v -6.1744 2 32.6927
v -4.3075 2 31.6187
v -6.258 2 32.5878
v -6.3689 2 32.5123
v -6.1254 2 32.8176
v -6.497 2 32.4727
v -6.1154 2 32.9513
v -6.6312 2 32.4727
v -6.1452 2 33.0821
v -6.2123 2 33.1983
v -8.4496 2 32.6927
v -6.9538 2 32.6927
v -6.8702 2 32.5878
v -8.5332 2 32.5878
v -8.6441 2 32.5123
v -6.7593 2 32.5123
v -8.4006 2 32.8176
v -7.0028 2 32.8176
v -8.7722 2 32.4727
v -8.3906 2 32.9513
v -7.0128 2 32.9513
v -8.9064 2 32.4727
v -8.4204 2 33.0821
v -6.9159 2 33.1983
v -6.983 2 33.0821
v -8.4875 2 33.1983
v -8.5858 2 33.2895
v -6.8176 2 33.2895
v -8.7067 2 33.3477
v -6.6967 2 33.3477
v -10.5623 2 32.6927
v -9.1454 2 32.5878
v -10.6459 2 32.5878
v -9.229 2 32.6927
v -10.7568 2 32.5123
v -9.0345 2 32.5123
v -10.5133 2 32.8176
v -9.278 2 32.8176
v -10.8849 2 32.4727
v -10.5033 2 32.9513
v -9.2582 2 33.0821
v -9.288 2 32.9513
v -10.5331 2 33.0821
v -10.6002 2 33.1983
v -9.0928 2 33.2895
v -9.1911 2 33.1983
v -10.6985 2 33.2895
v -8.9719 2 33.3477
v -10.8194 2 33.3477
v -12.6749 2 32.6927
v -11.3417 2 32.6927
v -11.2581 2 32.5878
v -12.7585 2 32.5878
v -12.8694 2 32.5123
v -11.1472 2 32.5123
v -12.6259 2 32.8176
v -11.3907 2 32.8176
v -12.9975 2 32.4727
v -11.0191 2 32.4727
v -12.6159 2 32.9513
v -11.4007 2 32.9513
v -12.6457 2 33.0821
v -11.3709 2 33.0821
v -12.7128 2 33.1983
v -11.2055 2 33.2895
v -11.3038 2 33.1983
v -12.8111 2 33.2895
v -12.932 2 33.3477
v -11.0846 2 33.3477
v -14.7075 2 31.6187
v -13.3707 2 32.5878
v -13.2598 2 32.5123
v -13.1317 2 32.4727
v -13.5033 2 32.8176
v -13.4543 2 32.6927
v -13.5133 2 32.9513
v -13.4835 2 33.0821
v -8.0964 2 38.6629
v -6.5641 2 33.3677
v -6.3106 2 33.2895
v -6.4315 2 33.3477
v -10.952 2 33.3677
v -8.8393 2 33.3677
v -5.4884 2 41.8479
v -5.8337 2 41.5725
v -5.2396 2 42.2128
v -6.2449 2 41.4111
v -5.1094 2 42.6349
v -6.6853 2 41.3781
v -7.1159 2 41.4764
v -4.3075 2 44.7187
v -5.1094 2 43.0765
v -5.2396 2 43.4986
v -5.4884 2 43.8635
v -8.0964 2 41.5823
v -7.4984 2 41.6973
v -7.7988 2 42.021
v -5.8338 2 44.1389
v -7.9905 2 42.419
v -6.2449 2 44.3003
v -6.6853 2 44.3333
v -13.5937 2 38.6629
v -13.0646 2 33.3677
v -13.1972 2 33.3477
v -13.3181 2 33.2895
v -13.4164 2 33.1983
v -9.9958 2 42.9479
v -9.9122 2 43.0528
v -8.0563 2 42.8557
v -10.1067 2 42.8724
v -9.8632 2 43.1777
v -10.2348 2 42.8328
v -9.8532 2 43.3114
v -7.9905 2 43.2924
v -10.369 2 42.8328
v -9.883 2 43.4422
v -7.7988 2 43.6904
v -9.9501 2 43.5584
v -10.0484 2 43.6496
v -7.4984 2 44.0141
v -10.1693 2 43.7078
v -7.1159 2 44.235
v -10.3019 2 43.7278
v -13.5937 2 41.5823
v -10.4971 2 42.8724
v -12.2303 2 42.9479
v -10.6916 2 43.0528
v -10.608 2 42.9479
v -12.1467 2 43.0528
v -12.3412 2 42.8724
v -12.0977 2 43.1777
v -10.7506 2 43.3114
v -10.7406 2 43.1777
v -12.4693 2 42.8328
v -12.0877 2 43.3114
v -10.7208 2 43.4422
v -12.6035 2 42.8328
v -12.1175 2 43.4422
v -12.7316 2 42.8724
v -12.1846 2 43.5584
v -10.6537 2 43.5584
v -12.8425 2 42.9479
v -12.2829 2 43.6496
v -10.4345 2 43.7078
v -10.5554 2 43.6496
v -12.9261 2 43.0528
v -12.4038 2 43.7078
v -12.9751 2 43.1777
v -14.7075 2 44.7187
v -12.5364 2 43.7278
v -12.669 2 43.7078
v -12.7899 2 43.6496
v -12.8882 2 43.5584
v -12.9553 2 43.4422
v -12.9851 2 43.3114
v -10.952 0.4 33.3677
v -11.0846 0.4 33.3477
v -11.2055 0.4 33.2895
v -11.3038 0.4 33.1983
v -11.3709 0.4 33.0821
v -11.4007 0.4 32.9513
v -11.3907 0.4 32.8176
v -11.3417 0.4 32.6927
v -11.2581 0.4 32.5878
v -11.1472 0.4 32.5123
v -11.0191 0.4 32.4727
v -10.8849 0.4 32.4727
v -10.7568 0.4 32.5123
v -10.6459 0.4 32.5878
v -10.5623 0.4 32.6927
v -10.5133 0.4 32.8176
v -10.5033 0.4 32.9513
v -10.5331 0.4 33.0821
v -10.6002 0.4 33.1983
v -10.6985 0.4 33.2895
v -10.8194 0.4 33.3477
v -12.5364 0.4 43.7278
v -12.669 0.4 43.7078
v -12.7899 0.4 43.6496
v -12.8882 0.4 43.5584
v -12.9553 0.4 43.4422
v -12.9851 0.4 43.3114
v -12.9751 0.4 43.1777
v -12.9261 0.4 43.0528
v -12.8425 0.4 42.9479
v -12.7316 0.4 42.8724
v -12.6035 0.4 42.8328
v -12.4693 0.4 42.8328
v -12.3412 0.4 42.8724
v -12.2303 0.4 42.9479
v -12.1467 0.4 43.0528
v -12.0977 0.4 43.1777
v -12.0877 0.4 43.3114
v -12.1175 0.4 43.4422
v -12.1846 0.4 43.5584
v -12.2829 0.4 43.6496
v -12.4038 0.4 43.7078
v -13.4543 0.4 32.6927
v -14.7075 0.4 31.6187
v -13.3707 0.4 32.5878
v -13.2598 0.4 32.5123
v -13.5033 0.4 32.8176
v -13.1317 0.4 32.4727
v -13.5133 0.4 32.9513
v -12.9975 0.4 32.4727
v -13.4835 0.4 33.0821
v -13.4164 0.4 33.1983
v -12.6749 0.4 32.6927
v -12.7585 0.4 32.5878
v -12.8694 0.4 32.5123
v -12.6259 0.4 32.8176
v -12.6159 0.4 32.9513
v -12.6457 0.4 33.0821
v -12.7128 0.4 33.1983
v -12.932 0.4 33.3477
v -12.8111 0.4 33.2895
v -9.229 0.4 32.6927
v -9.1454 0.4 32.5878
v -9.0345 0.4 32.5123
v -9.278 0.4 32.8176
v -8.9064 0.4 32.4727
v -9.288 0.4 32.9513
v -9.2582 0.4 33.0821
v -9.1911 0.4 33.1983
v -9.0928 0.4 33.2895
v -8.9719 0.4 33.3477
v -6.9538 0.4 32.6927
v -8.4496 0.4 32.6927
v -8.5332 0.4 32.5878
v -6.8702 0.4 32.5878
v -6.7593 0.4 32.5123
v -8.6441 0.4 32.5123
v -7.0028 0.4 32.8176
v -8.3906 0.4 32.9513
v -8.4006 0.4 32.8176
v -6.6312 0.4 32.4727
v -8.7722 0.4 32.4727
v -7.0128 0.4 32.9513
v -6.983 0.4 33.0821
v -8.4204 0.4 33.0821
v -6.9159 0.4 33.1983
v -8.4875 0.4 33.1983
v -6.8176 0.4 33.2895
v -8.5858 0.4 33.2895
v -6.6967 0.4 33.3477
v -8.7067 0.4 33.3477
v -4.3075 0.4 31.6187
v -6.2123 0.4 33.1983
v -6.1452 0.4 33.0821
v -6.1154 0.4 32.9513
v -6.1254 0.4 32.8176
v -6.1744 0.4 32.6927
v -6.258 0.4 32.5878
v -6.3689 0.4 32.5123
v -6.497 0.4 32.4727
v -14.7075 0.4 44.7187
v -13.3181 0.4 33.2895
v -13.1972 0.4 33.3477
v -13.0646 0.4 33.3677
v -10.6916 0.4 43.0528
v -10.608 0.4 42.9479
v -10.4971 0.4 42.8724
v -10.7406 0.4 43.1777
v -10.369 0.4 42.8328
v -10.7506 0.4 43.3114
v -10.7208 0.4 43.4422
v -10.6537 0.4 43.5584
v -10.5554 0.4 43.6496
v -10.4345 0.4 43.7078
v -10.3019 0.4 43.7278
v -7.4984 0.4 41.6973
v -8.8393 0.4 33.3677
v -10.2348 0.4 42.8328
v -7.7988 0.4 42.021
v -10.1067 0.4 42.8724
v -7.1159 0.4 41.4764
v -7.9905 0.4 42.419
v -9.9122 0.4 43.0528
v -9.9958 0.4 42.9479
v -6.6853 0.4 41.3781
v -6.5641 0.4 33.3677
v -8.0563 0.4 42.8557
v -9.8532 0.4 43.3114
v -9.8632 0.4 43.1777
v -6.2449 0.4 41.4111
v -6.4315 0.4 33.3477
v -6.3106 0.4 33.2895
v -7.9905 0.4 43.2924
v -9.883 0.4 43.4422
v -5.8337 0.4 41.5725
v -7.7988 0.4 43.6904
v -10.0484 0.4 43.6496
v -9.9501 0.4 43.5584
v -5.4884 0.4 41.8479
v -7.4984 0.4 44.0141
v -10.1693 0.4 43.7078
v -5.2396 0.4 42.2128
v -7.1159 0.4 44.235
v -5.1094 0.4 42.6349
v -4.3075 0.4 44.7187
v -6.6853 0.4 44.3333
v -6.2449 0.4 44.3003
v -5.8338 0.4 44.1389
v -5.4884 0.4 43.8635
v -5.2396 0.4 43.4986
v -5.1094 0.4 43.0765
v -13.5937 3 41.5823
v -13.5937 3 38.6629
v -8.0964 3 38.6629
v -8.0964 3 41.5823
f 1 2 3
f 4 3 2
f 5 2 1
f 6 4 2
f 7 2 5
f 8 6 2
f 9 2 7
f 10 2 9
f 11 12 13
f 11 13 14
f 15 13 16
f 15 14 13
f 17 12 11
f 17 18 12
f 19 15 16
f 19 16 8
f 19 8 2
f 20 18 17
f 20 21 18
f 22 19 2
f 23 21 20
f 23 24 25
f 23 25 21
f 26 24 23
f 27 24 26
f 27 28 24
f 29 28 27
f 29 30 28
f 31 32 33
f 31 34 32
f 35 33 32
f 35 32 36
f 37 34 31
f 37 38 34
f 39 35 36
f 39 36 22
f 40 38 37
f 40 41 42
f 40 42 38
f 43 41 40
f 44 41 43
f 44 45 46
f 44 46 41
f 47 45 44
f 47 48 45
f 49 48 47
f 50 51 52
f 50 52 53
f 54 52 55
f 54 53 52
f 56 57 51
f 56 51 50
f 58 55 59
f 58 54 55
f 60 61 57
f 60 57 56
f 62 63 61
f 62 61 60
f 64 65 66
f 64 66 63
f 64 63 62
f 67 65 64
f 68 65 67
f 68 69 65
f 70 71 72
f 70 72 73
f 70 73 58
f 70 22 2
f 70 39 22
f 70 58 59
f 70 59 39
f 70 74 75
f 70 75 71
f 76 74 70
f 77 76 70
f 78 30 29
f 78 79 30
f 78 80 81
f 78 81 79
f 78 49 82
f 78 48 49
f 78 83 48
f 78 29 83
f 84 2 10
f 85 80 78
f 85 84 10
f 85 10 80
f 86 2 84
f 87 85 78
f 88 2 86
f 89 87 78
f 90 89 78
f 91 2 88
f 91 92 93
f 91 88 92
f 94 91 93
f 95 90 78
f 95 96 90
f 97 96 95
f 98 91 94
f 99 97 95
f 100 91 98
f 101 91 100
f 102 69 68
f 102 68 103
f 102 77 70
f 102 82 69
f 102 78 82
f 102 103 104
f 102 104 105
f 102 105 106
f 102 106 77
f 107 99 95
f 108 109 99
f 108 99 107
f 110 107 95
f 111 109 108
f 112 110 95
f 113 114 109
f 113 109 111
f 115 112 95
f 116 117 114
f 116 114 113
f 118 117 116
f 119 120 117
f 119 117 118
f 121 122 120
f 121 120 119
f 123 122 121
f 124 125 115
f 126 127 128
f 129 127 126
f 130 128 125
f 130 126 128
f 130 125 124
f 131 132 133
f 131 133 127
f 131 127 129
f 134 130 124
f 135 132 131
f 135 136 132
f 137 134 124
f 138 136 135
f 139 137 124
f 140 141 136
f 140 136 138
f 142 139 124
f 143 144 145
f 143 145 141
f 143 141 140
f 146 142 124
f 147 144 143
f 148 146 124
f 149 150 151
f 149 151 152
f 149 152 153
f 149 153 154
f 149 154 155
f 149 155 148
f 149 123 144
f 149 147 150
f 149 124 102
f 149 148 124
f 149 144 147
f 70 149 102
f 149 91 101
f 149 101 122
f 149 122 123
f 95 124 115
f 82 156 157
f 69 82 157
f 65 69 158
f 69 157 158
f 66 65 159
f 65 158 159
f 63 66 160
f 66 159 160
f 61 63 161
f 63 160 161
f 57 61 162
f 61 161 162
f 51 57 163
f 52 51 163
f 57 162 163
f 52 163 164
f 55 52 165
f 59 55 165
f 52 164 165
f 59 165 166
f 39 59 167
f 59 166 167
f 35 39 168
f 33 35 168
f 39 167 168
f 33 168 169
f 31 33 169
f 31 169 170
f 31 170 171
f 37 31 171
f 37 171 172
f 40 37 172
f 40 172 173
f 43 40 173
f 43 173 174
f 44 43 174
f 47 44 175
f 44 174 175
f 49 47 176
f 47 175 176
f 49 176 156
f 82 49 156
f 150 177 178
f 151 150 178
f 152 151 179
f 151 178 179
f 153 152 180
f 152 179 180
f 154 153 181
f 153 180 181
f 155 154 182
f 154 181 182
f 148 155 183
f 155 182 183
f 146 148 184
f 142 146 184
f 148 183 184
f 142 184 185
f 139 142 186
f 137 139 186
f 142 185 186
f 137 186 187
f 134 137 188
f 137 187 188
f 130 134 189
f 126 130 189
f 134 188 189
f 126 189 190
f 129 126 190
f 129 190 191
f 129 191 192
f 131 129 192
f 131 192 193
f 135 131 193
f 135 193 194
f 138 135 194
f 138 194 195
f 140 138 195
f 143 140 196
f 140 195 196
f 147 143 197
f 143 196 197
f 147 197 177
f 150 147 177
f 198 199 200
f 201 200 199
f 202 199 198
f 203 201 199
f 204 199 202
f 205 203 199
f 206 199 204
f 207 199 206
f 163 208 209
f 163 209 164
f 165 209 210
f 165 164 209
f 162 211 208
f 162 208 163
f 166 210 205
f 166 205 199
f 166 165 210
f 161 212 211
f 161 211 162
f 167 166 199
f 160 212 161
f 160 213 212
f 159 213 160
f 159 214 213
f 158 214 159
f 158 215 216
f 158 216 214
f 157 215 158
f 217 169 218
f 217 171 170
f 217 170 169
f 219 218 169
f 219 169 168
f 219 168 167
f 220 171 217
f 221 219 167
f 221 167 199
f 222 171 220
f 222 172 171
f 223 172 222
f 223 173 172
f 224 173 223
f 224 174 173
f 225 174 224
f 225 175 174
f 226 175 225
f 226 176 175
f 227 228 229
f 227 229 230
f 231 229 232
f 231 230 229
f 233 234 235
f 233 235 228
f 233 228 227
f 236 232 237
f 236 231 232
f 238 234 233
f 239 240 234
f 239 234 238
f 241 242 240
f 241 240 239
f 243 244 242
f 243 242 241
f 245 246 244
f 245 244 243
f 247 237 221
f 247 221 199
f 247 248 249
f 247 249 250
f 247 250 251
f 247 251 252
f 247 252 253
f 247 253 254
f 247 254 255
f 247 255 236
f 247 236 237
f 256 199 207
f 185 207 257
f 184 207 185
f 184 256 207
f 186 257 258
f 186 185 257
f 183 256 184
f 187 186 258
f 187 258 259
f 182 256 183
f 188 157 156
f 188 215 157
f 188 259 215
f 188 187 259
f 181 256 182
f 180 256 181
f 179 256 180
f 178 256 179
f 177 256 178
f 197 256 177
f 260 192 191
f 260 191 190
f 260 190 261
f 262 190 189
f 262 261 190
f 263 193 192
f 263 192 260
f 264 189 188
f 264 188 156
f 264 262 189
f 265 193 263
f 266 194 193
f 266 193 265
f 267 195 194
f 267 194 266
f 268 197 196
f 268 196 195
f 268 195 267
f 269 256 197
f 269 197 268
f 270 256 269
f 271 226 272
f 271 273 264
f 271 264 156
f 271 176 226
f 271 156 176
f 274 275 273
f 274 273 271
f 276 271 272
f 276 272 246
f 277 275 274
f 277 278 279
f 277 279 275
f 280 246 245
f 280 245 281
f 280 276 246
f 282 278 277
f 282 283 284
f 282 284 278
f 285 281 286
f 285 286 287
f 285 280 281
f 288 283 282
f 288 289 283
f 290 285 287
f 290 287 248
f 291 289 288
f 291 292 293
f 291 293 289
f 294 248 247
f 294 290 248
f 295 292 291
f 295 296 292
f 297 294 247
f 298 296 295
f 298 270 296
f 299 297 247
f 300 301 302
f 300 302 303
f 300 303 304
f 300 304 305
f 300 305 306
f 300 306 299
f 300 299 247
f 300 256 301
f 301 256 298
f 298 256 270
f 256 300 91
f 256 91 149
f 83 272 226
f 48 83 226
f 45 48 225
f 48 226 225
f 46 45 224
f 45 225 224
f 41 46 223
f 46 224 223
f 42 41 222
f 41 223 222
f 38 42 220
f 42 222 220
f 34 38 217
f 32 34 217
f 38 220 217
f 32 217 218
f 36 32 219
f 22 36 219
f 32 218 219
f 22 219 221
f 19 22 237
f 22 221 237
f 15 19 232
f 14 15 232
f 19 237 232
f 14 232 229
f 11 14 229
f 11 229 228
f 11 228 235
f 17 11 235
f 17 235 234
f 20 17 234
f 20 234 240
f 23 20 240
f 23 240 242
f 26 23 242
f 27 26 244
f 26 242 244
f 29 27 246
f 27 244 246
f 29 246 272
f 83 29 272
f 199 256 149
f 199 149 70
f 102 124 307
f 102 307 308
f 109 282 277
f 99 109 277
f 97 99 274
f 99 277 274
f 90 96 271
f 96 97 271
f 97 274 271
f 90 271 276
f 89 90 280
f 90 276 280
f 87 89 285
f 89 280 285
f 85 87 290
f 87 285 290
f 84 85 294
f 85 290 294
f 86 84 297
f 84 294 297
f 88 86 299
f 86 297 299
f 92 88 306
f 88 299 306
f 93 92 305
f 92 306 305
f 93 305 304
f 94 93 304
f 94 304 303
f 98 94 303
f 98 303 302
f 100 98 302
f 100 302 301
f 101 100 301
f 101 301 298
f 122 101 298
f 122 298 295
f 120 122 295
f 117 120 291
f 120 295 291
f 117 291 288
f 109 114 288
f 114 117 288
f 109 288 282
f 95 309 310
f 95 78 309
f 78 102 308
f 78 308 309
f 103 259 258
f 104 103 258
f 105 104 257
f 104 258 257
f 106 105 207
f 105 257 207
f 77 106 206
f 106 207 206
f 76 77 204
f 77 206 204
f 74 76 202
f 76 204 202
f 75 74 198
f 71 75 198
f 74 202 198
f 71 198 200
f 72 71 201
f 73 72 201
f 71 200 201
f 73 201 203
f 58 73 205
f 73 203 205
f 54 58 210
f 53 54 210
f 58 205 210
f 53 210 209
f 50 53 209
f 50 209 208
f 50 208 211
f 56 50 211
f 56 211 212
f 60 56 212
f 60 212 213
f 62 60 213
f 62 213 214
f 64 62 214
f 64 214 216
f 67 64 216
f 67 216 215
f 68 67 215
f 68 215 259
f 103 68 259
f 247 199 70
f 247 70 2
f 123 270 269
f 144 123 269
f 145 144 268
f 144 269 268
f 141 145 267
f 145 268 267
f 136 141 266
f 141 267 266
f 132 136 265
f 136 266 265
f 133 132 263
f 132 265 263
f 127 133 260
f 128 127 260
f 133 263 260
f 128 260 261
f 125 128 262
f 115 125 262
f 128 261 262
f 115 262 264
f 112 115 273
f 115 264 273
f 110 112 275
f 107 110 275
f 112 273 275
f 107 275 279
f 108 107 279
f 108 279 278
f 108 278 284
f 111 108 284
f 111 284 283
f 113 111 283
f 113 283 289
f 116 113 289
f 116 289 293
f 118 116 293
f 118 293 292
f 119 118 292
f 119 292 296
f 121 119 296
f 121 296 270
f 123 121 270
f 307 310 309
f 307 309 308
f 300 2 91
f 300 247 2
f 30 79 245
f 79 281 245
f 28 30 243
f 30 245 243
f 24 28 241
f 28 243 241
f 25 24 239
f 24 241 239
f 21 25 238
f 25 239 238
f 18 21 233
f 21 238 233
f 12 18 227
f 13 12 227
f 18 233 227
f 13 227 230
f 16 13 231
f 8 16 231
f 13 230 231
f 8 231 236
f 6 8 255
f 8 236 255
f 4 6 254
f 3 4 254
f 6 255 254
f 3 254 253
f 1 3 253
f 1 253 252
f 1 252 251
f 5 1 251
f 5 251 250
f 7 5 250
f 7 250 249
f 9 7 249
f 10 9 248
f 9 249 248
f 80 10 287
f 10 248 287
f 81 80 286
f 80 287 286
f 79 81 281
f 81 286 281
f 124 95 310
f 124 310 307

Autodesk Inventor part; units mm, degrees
ref_plane "YZ Plane" through (0, 0, 0) normal (1, 0, 0) x (0, 1, 0)
ref_plane "XZ Plane" through (0, 0, 0) normal (0, 1, 0) x (-1, 0, 0)
ref_plane "XY Plane" through (0, 0, 0) normal (0, 0, 1) x (1, 0, 0)
sketch "Sketch1" plane through (0, 0, 0) normal (0, 1, 0) x (-1, 0, 0)
  line L0 (14.7075, 31.6187) -> (4.3075, 31.6187)
  line L1 (4.3075, 31.6187) -> (4.3075, 44.7187)
  line L2 (4.3075, 44.7187) -> (14.7075, 44.7187)
  line L3 (14.7075, 44.7187) -> (14.7075, 31.6187)
  line L4 (13.5937, 38.6629) -> (8.0964, 38.6629)
  line L5 (8.0964, 38.6629) -> (8.0964, 41.5823)
  line L6 (8.0964, 41.5823) -> (13.5937, 41.5823)
  line L7 (13.5937, 41.5823) -> (13.5937, 38.6629)
  circle A0 centre (6.5746, 42.8557) radius 1.4817
  point P0 (0, 0)
  dimension "d0" = 10.4
  dimension "d1" = 13.1
extrude "Extrusion1" add sketch "Sketch1" along normal blind 2
extrude "Extrusion2" add sketch "Sketch1" along normal blind 3 contours L4 L5 L6 L7
sketch "Sketch2" plane through (0, 2, 0) normal (0, 1, 0) x (1, 0, 0)
  line L0 (-13.674, -32.9177) -> (-5.5891, -32.9177)
  line L1 (-13.5937, -43.2778) -> (-9.2456, -43.2778)
  point P0 (0, 0)
  point P1 (-13.0646, -32.9177)
  point P2 (-6.5641, -32.9177)
  point P3 (-10.952, -32.9177)
  point P4 (-8.8393, -32.9177)
  point P5 (-12.5364, -43.2778)
  point P6 (-10.3019, -43.2778)
hole "Hole1" at (-13.0646, 2, 32.9177) at (-6.5641, 2, 32.9177) at (-10.952, 2, 32.9177) at (-8.8393, 2, 32.9177) at (-12.5364, 2, 43.2778) at (-10.3019, 2, 43.2778) direction (0, -1, 0) diameter 0.9 end through all
sketch "Sketch3" plane through (0, 0, 0) normal (0, -1, 0) x (1, 0, 0)
  circle A0 centre (-12.5364, 43.2778) radius 0.45 projected
  circle A1 centre (-10.952, 32.9177) radius 0.45 projected
  circle A2 centre (-13.0646, 32.9177) radius 0.45 projected
  circle A3 centre (-6.5641, 32.9177) radius 0.45 projected
  circle A4 centre (-8.8393, 32.9177) radius 0.45 projected
  circle A5 centre (-10.3019, 43.2778) radius 0.45 projected
  line L0 (-14.7075, 44.7187) -> (-4.3075, 44.7187) projected
  line L1 (-14.7075, 31.6187) -> (-14.7075, 44.7187) projected
  line L2 (-4.3075, 31.6187) -> (-14.7075, 31.6187) projected
  line L3 (-4.3075, 44.7187) -> (-4.3075, 31.6187) projected
  circle A6 centre (-6.5746, 42.8557) radius 1.4817 projected
  point P0 (0, 0)
extrude "Extrusion3" cut sketch "Sketch3" against normal blind 0.4
sketch "Sketch4" plane through (-13.5937, 2, 41.5823) normal (0, 0, 1) x (1, 0, 0)
  line L0 (5.4973, 0) -> (0, 0) projected
  line L1 (5.4973, 0) -> (5.4973, 1) projected
  line L2 (0, 1) -> (5.4973, 1) projected
  line L3 (0, 0) -> (0, 1) projected
  line L4 (9.2862, 0) -> (-1.1138, 0) projected
  line L5 (2.7486, 0) -> (2.7486, 3.0289)
  line L6 (2.7486, 0) -> (3.8152, 4.8108)
  line L7 (2.7486, 0) -> (1.9494, 3.6052)
  line L8 (3.8152, 4.8108) -> (52.0967, 222.5946)
  line L9 (1.9494, 3.6052) -> (-46.5994, 222.5946)
  arc A0 (52.0967, 222.5946) -> (-46.5994, 222.5946) centre (2.7486, 0) ccw
  point P0 (13.5937, -2)
  dimension "d15" = 12.5
  dimension "d16" = 12.5
properties part number "tof"
